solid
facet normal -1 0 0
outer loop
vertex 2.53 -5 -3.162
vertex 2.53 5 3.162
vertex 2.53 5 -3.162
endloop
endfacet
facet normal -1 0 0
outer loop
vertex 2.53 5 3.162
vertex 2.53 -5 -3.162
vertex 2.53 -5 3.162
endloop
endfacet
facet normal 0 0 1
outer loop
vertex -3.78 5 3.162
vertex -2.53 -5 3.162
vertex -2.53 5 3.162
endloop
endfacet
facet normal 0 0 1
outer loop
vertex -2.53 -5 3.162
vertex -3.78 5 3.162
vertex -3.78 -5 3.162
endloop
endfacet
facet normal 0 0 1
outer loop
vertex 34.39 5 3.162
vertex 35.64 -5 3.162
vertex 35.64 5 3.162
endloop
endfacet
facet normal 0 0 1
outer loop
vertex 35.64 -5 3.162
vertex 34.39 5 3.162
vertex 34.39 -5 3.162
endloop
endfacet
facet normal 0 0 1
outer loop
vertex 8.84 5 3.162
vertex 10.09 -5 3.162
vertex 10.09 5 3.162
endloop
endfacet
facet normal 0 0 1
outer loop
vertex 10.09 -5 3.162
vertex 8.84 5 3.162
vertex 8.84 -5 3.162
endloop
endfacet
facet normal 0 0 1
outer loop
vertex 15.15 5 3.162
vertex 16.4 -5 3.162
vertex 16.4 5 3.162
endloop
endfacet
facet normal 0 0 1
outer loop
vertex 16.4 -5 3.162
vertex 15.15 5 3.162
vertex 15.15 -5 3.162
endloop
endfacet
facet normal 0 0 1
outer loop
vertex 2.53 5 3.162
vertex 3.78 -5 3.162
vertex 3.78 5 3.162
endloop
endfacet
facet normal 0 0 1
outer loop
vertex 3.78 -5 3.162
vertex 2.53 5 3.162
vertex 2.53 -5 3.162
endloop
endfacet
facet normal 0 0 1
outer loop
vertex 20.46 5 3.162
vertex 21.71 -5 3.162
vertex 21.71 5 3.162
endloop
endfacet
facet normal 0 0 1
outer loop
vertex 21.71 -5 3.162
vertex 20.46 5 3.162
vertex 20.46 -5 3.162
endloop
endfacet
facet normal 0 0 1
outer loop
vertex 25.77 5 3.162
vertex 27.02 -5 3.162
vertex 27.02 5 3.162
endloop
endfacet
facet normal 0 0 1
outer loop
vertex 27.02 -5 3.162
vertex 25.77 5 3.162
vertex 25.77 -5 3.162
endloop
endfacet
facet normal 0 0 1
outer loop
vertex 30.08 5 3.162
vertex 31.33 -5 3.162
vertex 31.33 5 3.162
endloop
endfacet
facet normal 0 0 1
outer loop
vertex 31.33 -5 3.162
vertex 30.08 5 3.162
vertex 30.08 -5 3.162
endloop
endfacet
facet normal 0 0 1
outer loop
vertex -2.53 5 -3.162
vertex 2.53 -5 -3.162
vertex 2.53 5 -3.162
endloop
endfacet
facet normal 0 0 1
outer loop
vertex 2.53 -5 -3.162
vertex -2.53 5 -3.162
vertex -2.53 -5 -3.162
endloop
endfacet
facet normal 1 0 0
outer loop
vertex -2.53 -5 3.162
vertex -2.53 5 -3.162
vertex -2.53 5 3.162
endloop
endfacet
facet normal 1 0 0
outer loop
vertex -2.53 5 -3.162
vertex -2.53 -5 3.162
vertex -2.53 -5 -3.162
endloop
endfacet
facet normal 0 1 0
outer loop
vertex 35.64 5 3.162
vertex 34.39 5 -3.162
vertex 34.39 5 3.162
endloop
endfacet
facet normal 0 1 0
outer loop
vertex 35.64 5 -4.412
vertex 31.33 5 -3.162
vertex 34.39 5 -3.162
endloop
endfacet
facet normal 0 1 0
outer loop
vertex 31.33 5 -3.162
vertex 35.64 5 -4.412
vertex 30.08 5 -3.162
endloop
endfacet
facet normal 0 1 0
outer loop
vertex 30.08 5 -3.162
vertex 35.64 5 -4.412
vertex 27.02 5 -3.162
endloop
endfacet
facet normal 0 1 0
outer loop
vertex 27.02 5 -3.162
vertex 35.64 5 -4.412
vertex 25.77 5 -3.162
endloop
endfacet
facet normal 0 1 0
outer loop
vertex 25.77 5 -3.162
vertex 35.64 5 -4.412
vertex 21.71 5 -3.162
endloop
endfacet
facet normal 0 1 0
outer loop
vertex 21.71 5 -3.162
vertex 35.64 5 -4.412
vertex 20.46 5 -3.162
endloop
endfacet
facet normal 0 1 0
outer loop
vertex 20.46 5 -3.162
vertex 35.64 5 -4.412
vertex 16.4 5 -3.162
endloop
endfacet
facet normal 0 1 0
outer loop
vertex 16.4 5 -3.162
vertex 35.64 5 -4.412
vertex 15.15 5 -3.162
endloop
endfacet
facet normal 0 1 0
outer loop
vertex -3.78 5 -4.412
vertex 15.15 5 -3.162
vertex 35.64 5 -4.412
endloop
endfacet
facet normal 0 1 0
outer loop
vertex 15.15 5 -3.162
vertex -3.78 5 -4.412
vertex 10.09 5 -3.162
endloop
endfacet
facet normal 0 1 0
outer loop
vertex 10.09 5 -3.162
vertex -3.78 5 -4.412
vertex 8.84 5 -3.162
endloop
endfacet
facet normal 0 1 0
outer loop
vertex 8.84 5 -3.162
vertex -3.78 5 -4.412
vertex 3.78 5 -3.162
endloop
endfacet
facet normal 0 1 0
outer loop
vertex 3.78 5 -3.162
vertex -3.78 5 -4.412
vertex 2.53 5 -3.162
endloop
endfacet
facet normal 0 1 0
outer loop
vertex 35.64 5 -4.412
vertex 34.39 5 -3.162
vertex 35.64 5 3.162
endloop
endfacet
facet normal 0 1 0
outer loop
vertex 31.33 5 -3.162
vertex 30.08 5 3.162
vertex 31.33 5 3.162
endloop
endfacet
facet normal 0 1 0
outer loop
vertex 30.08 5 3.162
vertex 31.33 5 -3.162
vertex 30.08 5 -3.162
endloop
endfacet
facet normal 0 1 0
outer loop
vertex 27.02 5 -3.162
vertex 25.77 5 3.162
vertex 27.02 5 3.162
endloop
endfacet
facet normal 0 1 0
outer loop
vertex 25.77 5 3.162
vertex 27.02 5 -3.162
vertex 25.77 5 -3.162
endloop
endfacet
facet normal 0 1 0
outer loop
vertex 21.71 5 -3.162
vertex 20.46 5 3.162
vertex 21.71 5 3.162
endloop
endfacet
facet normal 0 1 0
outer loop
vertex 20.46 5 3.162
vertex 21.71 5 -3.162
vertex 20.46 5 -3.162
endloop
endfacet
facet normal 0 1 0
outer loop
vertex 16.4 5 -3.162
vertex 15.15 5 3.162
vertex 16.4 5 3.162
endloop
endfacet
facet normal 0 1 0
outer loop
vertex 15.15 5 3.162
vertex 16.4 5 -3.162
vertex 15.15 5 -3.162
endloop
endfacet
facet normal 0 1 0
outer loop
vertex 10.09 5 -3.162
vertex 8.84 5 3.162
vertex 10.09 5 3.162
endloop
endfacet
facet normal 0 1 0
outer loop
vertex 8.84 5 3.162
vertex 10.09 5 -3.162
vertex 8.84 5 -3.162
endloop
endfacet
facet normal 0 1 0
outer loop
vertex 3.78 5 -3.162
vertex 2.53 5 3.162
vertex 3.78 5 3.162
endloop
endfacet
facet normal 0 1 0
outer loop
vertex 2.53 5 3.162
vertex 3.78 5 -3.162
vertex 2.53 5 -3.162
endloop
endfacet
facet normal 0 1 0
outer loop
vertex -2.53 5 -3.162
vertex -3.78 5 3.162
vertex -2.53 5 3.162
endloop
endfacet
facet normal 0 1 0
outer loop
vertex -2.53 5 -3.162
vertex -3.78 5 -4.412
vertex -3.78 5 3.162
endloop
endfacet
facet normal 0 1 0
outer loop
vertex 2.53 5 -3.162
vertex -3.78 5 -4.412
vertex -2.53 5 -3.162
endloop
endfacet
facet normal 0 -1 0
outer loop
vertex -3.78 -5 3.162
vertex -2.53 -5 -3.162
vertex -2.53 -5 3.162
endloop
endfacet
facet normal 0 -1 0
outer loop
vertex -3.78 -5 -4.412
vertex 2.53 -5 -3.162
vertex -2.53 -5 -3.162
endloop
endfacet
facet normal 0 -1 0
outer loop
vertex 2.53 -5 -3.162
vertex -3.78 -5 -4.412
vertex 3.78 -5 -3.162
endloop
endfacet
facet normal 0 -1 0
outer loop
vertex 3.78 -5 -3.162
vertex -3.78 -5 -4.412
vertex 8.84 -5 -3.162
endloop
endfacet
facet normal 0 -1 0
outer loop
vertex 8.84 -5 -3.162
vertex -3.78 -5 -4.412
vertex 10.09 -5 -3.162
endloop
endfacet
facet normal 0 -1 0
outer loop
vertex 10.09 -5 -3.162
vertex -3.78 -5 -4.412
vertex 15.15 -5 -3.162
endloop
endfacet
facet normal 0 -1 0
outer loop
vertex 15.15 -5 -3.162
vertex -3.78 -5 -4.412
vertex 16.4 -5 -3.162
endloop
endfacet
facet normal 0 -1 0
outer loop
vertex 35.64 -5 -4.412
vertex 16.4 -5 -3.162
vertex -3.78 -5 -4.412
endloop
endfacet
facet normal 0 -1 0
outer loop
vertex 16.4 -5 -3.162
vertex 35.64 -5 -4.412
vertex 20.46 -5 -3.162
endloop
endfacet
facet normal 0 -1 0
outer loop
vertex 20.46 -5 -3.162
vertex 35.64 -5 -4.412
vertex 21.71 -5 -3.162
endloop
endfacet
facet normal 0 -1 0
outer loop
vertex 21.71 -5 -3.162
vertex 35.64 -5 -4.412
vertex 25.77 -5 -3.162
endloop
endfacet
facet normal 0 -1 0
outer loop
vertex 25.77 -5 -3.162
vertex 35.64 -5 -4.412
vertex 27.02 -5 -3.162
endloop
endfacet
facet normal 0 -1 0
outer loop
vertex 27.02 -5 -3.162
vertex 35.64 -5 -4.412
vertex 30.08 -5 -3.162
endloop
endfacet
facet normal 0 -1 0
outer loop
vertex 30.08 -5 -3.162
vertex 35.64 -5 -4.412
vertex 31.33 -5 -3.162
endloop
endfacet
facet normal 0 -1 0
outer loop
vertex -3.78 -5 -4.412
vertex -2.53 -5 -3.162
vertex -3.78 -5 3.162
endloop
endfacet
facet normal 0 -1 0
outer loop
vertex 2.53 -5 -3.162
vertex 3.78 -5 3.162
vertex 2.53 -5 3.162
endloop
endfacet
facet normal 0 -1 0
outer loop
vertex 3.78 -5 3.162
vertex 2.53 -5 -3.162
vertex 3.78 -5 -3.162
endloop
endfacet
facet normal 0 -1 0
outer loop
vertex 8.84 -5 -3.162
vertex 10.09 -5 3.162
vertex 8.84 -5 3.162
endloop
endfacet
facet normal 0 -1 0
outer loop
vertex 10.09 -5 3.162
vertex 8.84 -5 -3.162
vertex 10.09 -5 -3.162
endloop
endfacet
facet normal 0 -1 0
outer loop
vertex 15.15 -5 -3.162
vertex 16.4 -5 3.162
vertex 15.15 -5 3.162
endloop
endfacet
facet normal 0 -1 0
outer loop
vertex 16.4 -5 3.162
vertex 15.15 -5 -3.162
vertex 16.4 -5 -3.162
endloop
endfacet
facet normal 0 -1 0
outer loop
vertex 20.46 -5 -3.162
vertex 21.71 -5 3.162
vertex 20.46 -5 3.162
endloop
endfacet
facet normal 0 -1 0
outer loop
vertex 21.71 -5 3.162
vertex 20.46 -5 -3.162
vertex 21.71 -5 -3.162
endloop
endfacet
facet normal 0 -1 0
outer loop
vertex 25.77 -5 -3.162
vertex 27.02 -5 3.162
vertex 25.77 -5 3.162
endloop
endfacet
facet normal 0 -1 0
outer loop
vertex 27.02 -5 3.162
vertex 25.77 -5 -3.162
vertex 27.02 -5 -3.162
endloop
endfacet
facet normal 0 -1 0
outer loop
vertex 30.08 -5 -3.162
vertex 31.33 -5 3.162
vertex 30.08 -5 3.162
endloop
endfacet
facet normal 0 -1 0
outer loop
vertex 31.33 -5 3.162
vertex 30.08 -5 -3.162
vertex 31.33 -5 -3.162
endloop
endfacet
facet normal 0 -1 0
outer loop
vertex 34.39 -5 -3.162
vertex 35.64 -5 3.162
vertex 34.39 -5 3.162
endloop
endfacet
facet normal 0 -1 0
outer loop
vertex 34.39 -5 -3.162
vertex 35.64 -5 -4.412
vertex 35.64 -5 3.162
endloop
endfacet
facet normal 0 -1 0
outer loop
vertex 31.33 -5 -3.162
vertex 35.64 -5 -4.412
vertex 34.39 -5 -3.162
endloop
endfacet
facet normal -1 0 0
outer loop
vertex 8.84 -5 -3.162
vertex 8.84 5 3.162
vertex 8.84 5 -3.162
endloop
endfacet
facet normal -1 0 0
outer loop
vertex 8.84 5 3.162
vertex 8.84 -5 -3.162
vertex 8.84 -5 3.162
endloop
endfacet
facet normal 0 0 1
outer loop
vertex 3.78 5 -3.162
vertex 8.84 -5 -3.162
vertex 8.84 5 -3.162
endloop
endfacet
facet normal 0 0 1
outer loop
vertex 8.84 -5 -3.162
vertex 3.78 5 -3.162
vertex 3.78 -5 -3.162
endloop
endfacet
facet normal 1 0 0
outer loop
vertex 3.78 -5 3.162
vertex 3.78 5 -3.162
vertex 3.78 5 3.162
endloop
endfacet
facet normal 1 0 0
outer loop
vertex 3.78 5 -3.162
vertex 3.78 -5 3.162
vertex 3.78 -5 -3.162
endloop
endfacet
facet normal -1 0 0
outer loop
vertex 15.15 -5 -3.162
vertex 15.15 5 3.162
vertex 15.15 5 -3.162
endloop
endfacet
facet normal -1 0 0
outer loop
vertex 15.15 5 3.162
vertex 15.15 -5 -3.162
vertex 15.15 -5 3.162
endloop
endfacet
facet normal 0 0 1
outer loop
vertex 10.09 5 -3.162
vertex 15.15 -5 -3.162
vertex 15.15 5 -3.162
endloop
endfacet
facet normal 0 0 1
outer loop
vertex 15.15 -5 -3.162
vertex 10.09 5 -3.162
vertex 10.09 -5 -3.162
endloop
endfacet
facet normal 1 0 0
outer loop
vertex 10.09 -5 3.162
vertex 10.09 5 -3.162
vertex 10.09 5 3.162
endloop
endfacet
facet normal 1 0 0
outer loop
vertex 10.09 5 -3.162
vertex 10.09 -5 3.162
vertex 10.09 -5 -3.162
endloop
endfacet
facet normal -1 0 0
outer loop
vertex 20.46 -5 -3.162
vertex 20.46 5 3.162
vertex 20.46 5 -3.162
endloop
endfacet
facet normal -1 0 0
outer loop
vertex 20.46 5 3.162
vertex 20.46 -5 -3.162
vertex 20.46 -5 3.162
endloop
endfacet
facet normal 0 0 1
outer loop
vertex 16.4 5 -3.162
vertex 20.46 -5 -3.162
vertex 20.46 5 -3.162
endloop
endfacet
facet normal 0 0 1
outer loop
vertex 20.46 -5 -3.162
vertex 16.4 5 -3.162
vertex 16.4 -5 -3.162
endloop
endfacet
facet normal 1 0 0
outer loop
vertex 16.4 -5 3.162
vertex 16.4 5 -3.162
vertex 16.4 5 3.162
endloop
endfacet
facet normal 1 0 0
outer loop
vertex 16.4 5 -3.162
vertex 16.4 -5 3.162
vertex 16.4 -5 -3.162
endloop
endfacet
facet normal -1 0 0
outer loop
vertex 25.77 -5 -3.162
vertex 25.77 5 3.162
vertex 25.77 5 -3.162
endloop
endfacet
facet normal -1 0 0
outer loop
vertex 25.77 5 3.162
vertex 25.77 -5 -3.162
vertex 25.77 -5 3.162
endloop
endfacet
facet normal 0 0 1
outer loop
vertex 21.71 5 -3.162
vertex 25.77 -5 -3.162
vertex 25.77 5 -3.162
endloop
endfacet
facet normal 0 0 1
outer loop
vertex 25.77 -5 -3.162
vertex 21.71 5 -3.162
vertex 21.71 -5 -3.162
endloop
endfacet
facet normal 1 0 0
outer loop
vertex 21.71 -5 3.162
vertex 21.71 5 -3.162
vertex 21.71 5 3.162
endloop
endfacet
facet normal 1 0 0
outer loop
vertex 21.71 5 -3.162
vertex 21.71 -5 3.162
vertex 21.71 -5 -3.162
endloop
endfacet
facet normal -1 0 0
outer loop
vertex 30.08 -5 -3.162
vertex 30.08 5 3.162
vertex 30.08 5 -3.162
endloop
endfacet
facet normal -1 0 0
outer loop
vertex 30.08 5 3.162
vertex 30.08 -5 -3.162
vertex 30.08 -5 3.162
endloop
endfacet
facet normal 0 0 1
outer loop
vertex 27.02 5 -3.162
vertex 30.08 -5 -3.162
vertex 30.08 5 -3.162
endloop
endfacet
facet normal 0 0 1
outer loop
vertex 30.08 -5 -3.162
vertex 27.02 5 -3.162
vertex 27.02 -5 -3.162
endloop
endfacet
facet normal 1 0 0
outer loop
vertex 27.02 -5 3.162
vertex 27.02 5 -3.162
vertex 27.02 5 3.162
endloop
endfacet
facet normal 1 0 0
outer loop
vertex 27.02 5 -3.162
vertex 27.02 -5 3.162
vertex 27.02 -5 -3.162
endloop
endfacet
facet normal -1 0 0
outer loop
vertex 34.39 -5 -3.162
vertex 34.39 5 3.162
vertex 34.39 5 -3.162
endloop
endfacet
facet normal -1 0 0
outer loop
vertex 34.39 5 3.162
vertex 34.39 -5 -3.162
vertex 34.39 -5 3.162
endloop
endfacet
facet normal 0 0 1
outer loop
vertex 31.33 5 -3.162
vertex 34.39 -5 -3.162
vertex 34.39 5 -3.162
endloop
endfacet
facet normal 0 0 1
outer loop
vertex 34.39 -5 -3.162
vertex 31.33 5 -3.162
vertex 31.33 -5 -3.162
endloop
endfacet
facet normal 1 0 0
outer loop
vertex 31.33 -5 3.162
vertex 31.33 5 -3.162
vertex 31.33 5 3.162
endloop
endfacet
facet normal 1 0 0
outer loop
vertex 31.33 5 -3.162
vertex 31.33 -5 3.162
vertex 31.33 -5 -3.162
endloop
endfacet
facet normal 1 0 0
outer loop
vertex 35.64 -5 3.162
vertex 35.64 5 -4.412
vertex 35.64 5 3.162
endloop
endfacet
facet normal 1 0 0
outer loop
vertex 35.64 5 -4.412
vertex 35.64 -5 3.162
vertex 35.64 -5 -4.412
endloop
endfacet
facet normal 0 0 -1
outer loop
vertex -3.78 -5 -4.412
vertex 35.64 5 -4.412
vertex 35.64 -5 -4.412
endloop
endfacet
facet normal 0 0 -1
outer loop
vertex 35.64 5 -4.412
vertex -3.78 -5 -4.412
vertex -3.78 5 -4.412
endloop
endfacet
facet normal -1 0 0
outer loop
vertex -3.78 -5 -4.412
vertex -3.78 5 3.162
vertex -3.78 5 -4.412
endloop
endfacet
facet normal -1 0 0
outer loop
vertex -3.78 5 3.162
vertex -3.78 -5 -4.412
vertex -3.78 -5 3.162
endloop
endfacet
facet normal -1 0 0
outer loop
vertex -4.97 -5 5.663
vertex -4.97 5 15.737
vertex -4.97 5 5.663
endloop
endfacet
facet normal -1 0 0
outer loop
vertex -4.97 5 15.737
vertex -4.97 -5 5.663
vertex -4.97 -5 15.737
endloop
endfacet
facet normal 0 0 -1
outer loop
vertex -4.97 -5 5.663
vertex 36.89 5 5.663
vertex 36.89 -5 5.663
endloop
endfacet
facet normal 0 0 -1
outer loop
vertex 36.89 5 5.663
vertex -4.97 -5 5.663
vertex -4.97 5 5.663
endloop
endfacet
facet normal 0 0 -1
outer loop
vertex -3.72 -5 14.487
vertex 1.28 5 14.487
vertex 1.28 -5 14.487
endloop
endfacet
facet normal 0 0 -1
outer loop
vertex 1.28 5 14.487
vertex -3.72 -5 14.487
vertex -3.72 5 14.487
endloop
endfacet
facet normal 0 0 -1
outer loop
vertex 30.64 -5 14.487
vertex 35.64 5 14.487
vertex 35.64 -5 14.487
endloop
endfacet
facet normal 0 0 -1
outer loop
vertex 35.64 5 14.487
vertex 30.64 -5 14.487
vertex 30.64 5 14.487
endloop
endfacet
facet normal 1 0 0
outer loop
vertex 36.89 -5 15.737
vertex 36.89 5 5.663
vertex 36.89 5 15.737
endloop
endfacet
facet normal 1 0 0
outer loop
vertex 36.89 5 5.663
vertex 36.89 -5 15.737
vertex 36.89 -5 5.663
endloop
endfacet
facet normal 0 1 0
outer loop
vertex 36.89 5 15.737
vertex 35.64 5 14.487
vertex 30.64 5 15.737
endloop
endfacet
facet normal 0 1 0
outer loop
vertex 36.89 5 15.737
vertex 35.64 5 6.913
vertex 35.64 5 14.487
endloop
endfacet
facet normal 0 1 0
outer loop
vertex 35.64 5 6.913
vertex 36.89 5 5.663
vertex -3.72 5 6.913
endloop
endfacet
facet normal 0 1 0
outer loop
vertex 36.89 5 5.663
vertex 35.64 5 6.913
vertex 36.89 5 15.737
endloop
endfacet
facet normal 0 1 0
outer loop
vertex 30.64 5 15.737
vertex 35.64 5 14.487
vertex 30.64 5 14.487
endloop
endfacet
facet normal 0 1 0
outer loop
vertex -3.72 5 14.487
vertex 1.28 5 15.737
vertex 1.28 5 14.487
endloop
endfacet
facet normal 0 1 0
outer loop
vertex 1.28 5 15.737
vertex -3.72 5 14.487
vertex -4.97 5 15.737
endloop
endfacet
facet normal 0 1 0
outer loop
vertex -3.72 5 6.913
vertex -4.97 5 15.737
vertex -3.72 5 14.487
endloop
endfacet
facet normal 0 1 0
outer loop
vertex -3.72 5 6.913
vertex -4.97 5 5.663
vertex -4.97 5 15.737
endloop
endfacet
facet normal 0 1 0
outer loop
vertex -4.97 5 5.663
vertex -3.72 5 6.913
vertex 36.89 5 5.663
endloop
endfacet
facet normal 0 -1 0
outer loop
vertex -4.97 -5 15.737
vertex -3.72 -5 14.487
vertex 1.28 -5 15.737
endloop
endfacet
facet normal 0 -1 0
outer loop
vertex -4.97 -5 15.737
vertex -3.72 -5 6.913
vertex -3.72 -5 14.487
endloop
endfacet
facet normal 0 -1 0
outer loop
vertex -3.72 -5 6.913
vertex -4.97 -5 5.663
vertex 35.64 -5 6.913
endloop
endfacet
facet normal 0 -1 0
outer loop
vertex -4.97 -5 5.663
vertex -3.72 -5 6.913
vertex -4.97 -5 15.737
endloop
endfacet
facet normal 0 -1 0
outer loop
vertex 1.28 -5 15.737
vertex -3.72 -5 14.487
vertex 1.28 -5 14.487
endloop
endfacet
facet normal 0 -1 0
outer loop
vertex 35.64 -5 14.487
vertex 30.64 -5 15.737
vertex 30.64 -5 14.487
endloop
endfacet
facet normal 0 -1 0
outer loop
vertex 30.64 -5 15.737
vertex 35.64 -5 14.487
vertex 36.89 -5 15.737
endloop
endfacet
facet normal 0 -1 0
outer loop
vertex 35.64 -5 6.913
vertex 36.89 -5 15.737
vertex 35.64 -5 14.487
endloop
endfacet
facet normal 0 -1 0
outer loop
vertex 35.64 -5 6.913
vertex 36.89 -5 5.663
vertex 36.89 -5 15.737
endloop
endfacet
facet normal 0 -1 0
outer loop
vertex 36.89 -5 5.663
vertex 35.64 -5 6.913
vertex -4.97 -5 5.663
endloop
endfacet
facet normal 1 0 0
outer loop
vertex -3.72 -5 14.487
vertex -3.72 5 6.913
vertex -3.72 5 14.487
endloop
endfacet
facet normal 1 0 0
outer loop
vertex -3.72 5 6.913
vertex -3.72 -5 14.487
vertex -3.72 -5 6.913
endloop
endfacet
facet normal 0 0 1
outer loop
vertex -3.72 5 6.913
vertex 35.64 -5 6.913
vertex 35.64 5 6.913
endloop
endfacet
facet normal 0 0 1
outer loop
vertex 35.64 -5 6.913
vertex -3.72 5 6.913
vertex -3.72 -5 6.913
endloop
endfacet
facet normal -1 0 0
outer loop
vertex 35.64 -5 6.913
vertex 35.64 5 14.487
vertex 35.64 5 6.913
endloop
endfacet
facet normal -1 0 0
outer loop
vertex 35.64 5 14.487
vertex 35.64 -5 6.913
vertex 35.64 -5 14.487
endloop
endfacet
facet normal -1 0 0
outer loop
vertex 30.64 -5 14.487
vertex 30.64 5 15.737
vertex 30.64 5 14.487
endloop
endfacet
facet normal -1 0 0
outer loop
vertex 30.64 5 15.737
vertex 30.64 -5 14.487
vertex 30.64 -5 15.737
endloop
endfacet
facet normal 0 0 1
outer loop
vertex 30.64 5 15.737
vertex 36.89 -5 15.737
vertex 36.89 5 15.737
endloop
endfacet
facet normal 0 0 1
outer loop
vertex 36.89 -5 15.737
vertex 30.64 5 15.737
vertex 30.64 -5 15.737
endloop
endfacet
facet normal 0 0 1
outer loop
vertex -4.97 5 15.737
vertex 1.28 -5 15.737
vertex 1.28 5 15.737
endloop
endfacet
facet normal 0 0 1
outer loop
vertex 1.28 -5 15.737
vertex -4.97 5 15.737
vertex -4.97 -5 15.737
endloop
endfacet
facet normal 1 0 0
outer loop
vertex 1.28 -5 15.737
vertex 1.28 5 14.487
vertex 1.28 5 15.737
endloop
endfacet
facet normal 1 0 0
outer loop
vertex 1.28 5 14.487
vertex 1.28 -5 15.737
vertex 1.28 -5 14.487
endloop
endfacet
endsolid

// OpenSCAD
wire_thickness_a = 5.06;
wire_thickness_b = 4.06;
wire_thickness_c = 3.06;

wire_length = 10;
wire_height = max(wire_thickness_a, wire_thickness_b, wire_thickness_c) * 1.25;

wall_thickness = 1.25;

wire_count_a = 3;
wire_count_b = 2;
wire_count_c = 2;

lid_gripper_length = 5;

b_xoffset = get_offset(wire_thickness_a, wire_count_a, wire_thickness_b);
c_xoffset = b_xoffset + get_offset(wire_thickness_b, wire_count_b, wire_thickness_c);

box_total_width = c_xoffset + get_offset(wire_thickness_c, wire_count_c, 0) - wall_thickness + wire_thickness_a / 2 + wall_thickness * 2;
lid_total_width = box_total_width - 0.06;
box_total_height = wire_height + wall_thickness;

module wire_holder(col, count, thickness, wire_offset = 0) {
    for (i = [0 : count - 1]) {
        color(col, 0.5)
        translate([wire_offset + (thickness + wall_thickness) * i, 0, 0])
        cube([thickness, wire_length, wire_height], center = true);
    }
}

function get_offset(previous_thickness, previous_count, next_thickness) = (
previous_thickness * 0.5 + previous_thickness * (previous_count - 1) + (previous_count * wall_thickness) + next_thickness * 0.5
);

module wire_holders() {
    wire_holder("red", wire_count_a, wire_thickness_a);
    wire_holder("green", wire_count_b, wire_thickness_b, b_xoffset);
    wire_holder("blue", wire_count_c, wire_thickness_c, c_xoffset);    
}

module surrounding_box(total_width = box_total_width) {
    color("white", 0.5)
    translate([-wire_thickness_a / 2 - wall_thickness, -wire_length / 2, -wire_height / 2 - wall_thickness])
    cube([total_width, wire_length, box_total_height]);
}

module lid() {
    color("blue", 0.5)
    translate([-wire_thickness_a / 2 - wall_thickness * 2, -wire_length / 2, -wire_height / 2 - wall_thickness])
    cube([lid_total_width + wall_thickness * 2, wire_length, box_total_height + wall_thickness]);
}

module lid_grippers() {
    color("purple", 0.5)
    translate([-wire_thickness_a / 2 - wall_thickness * 2, -wire_length / 2, -wire_height / 2 - wall_thickness * 2])
    cube([lid_gripper_length + wall_thickness, wire_length, wall_thickness]);
    
    color("purple", 0.5)
    translate([lid_total_width - lid_gripper_length + wall_thickness -wire_thickness_a / 2 - wall_thickness * 2, -wire_length / 2, -wire_height / 2 - wall_thickness * 2])
    cube([lid_gripper_length + wall_thickness, wire_length, wall_thickness]);
}

difference() {
    surrounding_box();
    wire_holders();  
}

translate([box_total_width - wire_thickness_a - wall_thickness * 2, 0, box_total_height + wall_thickness * 2])
rotate([0, 180, 0])
union() {
    difference() {
        lid();
        surrounding_box(lid_total_width);
    }
    lid_grippers();
}
